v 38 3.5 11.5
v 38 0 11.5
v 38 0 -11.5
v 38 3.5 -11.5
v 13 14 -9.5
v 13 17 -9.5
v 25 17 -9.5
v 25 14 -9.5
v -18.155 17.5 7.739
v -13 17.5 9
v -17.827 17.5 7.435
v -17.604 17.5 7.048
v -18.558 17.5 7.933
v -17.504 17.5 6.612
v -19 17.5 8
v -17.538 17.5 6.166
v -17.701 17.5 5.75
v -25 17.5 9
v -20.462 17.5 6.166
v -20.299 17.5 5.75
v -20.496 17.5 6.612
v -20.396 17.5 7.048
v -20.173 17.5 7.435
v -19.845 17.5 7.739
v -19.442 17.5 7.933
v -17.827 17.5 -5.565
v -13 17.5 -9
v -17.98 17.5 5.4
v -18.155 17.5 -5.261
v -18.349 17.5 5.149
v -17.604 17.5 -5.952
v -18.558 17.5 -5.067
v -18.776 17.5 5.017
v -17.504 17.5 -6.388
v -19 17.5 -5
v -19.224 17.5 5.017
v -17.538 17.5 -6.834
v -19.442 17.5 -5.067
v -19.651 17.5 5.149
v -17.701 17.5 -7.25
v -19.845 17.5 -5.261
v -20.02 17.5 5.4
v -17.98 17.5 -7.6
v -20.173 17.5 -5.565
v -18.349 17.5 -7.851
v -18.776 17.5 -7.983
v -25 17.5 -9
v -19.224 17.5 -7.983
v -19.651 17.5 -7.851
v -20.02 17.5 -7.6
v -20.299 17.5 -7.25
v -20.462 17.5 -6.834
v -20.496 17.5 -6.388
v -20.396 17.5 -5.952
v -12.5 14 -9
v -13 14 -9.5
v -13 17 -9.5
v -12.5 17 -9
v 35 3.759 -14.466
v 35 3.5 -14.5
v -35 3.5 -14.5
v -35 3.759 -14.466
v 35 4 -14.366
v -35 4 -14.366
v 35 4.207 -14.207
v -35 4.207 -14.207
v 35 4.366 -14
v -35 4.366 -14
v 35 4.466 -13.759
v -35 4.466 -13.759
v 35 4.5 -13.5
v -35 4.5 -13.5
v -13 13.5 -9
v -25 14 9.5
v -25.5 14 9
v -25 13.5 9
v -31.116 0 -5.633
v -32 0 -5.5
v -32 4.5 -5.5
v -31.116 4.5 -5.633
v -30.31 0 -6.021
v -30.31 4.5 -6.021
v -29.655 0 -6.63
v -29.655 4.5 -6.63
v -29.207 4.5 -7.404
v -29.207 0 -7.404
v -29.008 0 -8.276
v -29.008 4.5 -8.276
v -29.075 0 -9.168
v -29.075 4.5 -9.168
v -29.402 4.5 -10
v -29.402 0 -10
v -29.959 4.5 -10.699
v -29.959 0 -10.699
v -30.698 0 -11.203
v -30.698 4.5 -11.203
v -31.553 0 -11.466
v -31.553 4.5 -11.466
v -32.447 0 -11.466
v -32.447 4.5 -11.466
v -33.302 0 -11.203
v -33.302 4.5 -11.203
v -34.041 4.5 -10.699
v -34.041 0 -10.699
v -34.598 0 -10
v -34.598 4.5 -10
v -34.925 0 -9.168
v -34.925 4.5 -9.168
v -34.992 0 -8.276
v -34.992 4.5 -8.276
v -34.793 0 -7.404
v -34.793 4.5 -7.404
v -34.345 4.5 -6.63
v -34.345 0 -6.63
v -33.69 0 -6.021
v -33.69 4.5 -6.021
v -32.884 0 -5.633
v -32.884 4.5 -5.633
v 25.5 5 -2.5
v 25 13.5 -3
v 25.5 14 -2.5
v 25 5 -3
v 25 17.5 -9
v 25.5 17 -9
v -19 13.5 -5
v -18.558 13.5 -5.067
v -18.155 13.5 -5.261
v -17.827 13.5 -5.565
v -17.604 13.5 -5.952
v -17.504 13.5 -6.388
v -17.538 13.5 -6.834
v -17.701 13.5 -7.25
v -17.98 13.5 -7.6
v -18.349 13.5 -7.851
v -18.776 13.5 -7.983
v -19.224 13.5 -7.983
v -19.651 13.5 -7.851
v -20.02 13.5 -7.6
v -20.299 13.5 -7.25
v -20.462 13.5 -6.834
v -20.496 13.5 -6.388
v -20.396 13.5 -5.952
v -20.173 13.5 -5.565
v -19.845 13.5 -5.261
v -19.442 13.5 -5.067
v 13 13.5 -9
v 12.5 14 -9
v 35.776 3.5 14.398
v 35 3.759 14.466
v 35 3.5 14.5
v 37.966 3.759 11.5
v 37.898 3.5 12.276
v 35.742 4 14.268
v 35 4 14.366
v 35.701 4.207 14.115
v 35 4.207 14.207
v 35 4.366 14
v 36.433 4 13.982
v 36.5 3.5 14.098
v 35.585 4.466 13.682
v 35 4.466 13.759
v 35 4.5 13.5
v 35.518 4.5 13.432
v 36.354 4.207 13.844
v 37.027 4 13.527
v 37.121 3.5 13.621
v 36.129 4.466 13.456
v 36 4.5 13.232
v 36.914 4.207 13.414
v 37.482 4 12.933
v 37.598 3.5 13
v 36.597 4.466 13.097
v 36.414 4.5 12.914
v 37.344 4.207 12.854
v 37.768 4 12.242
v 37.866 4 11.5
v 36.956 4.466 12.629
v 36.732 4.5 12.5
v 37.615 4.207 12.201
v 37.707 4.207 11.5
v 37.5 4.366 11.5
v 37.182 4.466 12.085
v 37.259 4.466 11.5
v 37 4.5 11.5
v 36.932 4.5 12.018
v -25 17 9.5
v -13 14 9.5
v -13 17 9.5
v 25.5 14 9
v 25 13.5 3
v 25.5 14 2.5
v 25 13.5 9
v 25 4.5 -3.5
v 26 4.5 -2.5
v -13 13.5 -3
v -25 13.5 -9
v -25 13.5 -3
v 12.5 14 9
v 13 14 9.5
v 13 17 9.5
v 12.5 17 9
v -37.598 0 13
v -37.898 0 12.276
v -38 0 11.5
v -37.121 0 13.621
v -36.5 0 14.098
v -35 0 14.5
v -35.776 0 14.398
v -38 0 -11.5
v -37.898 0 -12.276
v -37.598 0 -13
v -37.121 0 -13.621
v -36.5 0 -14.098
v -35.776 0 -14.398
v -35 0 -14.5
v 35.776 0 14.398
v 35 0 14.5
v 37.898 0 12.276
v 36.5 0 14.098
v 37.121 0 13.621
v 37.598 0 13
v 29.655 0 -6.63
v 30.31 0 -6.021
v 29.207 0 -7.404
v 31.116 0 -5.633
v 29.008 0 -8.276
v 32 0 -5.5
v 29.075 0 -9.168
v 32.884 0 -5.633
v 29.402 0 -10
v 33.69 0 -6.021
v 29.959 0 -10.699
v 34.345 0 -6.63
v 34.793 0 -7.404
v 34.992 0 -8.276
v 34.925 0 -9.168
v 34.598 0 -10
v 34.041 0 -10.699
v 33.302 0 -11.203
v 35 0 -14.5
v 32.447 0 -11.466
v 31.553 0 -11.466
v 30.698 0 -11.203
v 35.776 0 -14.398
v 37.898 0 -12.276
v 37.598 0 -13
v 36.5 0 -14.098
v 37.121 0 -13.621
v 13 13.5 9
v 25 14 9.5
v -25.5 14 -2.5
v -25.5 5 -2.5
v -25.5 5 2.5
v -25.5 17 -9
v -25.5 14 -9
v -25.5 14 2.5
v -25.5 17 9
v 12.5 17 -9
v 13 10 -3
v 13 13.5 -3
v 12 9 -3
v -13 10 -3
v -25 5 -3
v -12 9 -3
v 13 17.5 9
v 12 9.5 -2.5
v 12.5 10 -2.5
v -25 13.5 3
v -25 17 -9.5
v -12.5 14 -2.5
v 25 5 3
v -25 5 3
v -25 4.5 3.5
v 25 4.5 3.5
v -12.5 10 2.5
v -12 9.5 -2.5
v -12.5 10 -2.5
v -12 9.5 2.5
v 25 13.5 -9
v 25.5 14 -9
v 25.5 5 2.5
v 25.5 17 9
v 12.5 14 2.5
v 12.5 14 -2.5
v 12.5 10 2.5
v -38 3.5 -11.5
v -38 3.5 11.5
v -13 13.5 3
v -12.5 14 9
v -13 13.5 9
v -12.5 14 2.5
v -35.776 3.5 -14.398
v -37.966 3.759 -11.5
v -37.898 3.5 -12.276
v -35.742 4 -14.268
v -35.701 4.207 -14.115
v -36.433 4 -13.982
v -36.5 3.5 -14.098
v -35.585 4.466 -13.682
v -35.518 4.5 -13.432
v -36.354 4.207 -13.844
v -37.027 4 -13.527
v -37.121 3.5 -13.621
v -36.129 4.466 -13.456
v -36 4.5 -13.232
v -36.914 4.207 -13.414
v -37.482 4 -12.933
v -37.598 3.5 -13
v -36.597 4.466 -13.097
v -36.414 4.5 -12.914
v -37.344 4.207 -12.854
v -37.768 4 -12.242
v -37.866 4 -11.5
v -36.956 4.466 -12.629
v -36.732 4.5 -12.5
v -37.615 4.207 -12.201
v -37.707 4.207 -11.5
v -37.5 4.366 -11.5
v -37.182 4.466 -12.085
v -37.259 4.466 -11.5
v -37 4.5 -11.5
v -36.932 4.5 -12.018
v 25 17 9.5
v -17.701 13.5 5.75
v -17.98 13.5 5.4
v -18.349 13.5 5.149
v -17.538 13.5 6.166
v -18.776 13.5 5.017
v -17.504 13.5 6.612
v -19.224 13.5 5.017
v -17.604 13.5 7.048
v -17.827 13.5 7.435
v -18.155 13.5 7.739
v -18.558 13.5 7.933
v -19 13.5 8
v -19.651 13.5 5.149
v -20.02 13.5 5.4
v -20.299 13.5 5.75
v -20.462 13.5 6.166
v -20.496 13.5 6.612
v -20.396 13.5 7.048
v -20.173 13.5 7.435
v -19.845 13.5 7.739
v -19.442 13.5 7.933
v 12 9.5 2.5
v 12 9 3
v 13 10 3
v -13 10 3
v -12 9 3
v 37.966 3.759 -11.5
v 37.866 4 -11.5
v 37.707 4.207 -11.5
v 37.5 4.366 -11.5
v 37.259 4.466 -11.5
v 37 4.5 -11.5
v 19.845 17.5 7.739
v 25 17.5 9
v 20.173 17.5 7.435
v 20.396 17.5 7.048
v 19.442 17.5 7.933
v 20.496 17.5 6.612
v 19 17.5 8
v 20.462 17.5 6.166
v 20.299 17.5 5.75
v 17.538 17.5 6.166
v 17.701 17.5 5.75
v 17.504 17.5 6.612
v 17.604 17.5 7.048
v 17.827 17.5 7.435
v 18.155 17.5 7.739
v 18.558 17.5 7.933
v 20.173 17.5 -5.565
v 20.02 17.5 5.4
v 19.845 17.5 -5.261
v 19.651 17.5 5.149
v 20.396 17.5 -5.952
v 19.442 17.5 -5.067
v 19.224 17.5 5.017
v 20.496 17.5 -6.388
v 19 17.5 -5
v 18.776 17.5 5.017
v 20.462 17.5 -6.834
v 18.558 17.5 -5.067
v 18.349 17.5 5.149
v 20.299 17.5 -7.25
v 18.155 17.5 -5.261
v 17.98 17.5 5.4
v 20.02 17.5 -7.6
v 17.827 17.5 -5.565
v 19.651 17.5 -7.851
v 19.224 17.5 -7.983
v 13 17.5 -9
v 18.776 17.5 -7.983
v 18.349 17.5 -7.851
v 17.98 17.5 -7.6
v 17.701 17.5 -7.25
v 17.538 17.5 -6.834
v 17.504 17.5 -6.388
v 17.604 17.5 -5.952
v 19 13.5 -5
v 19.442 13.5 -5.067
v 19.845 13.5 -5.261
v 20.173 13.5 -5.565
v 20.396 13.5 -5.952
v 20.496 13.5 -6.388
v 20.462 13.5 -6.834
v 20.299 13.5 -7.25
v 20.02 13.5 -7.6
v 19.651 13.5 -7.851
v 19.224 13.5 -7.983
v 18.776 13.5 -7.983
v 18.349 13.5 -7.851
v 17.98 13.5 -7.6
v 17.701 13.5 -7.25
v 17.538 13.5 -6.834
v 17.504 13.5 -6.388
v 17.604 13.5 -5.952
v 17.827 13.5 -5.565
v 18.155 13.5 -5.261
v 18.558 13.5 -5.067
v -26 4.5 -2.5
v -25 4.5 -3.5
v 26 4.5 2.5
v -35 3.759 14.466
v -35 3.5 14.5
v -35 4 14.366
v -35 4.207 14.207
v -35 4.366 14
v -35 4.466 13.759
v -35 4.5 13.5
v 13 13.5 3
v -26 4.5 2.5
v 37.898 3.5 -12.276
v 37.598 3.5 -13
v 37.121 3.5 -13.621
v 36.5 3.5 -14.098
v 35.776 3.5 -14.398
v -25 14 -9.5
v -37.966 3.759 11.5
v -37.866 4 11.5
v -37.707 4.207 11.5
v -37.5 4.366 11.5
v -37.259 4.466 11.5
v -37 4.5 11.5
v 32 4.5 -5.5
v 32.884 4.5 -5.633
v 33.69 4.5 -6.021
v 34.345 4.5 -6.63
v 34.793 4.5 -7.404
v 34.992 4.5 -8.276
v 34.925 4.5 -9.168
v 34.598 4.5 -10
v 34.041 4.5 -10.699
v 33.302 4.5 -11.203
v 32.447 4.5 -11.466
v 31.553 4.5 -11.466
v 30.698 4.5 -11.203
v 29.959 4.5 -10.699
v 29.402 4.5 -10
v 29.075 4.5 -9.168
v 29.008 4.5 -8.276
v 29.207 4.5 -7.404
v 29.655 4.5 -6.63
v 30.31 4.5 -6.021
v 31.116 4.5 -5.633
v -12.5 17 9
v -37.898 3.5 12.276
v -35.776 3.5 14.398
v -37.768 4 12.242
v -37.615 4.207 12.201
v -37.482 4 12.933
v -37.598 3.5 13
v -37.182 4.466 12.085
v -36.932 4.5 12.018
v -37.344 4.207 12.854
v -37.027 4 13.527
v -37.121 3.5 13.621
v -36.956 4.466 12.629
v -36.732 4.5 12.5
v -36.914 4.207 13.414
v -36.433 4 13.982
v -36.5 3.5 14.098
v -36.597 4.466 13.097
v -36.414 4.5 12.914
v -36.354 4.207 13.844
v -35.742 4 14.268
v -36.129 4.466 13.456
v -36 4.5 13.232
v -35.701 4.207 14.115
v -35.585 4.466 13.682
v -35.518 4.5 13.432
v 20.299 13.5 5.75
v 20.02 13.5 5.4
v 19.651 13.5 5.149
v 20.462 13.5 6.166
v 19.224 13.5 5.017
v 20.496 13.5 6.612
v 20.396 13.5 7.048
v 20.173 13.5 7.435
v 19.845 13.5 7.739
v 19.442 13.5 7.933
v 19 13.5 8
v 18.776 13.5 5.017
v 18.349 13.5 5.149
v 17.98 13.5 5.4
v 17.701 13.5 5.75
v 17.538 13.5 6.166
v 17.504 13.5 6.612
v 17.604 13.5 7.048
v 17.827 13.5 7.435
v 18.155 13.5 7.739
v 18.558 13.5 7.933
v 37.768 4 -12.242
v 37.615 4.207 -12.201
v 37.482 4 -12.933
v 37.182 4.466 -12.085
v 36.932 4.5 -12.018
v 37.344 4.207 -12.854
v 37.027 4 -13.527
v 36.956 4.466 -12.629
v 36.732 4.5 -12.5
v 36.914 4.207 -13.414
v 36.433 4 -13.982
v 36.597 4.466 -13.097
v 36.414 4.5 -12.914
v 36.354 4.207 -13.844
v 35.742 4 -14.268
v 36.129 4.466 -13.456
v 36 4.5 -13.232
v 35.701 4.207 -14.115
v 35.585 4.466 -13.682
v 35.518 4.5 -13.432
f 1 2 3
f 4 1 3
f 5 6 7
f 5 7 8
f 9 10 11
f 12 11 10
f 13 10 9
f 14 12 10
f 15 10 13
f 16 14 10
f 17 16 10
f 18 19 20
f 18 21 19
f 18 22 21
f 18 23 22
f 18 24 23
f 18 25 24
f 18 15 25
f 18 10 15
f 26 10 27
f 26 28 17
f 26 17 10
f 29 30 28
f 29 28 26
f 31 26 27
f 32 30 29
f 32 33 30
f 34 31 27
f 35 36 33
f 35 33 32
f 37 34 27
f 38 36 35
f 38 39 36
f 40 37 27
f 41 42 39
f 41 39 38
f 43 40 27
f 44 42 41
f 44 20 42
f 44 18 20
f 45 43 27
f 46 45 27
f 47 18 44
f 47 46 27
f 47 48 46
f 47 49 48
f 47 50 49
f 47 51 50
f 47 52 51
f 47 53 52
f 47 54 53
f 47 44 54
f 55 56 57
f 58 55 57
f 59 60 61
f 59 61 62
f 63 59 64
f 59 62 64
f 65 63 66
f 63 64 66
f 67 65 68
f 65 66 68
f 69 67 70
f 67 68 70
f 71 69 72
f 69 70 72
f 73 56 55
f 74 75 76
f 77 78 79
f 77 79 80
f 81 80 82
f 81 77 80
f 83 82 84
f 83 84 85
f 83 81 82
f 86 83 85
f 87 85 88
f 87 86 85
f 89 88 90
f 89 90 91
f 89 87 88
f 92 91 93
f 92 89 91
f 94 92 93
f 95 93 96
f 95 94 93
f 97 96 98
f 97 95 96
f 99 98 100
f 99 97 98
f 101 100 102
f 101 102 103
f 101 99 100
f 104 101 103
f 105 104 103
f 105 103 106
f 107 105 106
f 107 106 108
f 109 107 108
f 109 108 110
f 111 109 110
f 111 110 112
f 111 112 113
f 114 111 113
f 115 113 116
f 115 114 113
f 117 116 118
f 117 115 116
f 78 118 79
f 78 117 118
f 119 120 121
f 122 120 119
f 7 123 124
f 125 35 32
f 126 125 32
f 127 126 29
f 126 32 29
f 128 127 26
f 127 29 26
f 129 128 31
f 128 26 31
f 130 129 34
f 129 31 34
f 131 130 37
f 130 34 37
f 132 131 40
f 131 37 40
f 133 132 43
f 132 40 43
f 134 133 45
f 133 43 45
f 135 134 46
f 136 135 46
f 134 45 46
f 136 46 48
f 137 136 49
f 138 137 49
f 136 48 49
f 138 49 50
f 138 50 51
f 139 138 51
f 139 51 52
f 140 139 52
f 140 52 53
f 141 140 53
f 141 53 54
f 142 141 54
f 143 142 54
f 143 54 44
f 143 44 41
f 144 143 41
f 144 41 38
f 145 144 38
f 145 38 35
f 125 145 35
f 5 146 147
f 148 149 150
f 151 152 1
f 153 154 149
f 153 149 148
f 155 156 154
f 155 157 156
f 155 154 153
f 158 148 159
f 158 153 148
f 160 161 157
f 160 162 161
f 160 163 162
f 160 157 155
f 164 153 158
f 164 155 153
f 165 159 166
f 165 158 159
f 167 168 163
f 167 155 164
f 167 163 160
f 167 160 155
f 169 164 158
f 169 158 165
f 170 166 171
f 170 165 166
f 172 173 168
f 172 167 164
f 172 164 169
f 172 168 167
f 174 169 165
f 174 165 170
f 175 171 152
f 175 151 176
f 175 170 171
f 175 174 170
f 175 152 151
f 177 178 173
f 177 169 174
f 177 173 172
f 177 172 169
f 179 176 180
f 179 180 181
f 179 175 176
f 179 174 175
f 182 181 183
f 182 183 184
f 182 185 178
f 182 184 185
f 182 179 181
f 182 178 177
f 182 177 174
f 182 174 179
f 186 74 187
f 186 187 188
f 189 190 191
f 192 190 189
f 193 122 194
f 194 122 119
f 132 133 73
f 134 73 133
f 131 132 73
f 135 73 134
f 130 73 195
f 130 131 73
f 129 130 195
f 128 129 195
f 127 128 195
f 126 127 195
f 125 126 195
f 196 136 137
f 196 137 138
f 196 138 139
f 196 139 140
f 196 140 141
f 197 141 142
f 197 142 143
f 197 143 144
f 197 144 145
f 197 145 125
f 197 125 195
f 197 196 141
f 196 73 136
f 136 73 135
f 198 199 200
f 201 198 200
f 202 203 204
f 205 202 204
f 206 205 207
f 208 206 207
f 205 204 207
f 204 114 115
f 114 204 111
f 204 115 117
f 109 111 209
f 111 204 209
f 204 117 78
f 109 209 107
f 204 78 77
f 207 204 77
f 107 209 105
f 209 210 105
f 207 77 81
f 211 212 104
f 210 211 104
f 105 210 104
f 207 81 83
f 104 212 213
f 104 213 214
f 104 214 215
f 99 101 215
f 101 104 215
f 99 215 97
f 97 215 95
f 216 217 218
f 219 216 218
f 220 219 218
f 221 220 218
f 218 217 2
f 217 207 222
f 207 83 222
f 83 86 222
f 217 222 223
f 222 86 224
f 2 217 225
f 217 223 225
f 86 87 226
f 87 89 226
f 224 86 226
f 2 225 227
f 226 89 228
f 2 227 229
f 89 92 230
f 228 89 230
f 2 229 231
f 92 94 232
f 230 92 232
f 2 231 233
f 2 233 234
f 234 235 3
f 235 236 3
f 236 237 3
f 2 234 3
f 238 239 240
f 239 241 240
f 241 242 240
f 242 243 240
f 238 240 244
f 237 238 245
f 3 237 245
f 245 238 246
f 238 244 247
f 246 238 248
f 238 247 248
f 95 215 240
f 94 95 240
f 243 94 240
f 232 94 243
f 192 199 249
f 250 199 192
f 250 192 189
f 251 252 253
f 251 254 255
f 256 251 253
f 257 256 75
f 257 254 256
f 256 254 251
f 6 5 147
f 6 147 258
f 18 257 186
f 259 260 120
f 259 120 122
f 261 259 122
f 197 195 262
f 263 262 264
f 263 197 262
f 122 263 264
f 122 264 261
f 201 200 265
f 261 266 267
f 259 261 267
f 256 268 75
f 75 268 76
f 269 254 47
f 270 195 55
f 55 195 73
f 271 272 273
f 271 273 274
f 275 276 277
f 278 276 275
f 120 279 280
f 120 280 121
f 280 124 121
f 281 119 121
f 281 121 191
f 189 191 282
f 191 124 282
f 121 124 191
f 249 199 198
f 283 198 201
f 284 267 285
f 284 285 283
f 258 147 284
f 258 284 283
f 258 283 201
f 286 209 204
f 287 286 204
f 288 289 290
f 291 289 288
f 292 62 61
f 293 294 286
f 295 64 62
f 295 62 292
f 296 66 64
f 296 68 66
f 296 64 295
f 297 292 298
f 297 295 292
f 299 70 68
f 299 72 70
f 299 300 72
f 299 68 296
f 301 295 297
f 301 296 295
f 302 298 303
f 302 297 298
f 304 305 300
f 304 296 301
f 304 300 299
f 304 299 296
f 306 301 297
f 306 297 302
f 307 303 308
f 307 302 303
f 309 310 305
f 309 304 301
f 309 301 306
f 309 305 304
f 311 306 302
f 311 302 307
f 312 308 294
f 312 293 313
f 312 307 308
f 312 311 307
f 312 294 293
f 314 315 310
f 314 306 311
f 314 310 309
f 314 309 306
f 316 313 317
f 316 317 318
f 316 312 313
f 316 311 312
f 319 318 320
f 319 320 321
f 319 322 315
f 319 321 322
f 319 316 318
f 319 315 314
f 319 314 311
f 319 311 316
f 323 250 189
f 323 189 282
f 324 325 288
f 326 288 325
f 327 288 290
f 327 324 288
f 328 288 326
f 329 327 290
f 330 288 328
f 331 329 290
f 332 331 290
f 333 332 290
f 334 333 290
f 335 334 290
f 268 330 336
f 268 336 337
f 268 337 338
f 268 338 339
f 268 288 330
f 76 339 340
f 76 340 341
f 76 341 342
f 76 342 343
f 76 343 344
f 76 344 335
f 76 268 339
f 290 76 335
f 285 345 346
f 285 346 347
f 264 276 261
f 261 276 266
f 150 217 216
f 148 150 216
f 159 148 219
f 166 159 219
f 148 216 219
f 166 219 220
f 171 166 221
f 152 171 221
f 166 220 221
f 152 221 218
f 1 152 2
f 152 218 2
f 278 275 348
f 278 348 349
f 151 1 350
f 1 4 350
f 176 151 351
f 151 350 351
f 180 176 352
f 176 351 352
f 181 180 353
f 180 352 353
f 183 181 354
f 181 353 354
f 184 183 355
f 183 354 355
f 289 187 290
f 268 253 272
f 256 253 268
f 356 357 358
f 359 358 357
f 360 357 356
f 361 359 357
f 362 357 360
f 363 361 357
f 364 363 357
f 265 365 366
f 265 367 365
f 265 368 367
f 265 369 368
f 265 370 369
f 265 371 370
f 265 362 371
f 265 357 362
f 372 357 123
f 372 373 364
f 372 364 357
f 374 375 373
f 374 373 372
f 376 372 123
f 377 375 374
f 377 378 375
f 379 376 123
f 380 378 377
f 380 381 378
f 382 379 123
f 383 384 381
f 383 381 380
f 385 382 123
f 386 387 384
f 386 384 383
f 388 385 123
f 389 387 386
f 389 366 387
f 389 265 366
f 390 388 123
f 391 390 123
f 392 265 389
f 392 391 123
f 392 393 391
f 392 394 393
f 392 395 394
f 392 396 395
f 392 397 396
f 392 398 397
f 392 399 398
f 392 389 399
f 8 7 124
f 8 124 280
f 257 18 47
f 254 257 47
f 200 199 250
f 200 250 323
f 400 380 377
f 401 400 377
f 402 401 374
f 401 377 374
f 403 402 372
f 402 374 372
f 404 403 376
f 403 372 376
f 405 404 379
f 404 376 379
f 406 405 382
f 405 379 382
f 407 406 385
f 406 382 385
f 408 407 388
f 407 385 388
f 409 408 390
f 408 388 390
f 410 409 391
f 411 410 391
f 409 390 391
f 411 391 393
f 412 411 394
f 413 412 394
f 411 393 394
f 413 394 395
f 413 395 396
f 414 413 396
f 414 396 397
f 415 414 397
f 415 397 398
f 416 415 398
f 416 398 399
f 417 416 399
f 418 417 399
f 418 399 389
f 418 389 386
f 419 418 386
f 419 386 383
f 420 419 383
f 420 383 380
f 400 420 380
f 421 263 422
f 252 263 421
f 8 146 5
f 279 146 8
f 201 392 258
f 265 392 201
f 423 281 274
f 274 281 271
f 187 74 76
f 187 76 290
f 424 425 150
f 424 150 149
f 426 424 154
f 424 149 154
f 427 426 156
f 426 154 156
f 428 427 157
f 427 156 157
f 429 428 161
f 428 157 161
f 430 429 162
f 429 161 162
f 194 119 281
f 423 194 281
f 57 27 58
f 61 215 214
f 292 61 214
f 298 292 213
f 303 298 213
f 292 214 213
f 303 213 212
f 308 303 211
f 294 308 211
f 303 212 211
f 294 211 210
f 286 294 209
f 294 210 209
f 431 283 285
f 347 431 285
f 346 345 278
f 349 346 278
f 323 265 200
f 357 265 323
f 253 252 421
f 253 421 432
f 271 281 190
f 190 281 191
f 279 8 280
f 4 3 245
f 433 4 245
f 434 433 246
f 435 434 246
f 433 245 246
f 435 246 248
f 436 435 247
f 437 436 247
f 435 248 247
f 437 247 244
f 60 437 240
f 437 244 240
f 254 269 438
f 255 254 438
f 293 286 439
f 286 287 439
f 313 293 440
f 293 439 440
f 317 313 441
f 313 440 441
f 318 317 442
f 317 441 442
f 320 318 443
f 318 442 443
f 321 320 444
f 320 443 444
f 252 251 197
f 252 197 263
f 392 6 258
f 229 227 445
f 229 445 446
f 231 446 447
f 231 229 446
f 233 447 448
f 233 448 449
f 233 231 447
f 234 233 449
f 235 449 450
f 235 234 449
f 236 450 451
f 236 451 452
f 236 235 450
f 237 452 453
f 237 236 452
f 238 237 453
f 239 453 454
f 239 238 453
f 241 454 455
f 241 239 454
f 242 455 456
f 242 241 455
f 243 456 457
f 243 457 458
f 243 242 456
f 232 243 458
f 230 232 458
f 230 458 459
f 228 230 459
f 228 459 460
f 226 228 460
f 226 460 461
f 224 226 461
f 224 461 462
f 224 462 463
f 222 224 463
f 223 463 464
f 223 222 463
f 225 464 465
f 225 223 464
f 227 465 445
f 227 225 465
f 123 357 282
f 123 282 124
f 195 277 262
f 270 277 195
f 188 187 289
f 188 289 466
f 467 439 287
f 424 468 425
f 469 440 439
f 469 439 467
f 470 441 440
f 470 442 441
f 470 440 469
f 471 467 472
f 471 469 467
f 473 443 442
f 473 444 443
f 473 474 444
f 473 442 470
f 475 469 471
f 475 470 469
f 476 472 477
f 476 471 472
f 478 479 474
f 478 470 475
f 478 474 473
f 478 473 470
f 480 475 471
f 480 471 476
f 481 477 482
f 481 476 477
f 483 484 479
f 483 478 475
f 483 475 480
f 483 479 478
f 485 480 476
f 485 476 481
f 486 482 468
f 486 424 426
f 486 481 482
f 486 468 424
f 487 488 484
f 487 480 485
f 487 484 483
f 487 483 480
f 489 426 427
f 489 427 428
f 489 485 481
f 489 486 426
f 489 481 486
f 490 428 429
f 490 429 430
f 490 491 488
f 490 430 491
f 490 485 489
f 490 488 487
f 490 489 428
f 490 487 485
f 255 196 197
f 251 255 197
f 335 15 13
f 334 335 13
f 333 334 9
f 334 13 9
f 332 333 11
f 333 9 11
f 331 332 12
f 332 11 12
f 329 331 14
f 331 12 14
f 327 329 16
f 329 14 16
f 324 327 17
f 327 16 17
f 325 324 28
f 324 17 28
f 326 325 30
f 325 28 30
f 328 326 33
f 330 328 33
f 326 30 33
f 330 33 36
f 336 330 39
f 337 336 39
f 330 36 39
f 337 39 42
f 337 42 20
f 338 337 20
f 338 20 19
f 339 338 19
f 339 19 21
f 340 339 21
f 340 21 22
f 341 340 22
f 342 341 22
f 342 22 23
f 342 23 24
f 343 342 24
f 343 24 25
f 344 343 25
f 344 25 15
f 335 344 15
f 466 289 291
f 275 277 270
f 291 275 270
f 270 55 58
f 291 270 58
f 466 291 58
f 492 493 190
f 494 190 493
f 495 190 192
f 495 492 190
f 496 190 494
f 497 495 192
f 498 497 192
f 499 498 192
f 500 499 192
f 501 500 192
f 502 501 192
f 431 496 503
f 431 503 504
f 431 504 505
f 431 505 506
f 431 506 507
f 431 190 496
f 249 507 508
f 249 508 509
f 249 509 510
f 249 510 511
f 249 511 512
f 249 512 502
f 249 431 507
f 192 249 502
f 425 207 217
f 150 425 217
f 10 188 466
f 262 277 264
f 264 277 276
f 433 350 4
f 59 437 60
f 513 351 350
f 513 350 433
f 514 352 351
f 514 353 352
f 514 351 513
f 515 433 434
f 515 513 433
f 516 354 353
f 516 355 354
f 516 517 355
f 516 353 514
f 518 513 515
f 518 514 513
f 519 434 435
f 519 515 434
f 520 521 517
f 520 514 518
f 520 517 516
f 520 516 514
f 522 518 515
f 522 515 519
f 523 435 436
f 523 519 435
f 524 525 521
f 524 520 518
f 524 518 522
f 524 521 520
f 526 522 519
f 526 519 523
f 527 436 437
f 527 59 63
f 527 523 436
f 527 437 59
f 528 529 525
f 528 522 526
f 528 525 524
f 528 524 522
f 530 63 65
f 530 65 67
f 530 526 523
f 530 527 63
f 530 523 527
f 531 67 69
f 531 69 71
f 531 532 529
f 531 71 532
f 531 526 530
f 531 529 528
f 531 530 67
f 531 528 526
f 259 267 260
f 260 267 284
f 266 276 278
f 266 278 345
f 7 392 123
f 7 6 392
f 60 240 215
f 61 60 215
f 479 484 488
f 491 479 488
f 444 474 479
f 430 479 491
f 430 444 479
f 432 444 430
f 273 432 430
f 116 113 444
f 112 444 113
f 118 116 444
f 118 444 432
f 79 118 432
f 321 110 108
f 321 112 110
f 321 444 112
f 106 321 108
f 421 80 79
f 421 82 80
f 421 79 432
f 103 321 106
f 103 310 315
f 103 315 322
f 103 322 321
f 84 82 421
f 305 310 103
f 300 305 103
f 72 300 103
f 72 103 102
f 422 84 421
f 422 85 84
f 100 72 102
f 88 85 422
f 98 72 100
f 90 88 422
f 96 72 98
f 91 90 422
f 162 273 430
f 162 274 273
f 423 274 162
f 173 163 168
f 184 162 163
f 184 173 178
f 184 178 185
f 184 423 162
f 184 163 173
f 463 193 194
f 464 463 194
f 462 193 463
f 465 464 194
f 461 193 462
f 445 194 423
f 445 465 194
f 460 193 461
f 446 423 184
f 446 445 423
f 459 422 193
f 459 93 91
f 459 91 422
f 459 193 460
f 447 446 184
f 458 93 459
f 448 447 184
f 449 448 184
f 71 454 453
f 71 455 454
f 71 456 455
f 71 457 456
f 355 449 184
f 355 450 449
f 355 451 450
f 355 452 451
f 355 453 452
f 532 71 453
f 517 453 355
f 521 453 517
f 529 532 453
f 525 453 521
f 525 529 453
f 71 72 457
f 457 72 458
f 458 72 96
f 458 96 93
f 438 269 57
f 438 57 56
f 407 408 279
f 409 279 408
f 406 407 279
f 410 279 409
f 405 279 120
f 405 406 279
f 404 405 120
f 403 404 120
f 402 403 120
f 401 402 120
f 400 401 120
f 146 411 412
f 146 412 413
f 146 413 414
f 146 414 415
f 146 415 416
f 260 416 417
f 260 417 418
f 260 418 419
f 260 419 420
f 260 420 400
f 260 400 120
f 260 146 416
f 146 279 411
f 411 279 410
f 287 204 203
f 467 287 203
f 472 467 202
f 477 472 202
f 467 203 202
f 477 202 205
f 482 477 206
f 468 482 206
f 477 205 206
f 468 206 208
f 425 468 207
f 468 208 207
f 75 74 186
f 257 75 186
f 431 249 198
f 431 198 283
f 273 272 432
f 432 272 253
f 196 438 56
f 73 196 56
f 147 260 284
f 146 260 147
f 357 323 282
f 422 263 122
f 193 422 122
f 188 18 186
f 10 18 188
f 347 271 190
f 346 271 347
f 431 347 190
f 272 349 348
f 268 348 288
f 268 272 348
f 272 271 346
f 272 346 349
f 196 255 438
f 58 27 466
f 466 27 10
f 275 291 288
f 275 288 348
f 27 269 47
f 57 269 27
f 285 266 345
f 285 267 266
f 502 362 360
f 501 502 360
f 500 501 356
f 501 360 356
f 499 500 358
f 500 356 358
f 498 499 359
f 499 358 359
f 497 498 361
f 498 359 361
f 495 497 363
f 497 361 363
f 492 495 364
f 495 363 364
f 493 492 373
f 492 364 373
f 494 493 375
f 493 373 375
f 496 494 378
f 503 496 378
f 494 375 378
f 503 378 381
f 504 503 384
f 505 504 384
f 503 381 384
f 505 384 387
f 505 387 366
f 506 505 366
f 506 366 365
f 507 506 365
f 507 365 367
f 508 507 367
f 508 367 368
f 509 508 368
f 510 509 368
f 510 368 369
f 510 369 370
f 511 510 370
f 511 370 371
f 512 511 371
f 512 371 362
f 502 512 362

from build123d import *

# Parameters (mm, degrees)
SKETCH1_R                = 3
BOSS_EXTRUDE1_DEPTH      = 4.5
BOSS_EXTRUDE2_DEPTH      = 25.5
BOSS_EXTRUDE2_DEPTH_BACK = 25.5
CUT_EXTRUDE1_DEPTH       = 9.5
CUT_EXTRUDE1_DEPTH_BACK  = 9.5
SKETCH3_W                = 25
SKETCH3_H                = 16
CUT_EXTRUDE2_REACH       = 46.278
SKETCH4_R                = 1.5
FILLET1_R                = 1
CHAMFER1_SIZE            = 0.5


with BuildPart() as part:
    # Sketch1 → Boss-Extrude1 (new body)
    with BuildSketch(Plane(origin=(0, 0, 0), x_dir=(1, 0, 0), z_dir=(0, 1, 0))):
        with BuildLine():
            Line((-35, -14.5), (35, -14.5))
            ThreePointArc((35, -14.5), (37.121320344, -13.621320344), (38, -11.5))
            Line((38, -11.5), (38, 11.5))
            ThreePointArc((38, 11.5), (37.121320344, 13.621320344), (35, 14.5))
            Line((35, 14.5), (-35, 14.5))
            ThreePointArc((-35, 14.5), (-37.121320344, 13.621320344), (-38, 11.5))
            Line((-38, 11.5), (-38, -11.5))
            ThreePointArc((-38, -11.5), (-37.121320344, -13.621320344), (-35, -14.5))
        make_face()
        with Locations(Location((-32, 8.5, 0), (0, 0, 270))):
            Circle(SKETCH1_R, mode=Mode.SUBTRACT)
        with Locations(Location((32, 8.5, 0), (0, 0, 270))):
            Circle(SKETCH1_R, mode=Mode.SUBTRACT)
    extrude(amount=BOSS_EXTRUDE1_DEPTH)

    # Sketch2 → Boss-Extrude2 (add, two sides: drawn at the far end of the back side and taken through both)
    with BuildSketch(Plane(origin=(0, 0, 0), x_dir=(0, 0, -1), z_dir=(1, 0, 0)).offset(-BOSS_EXTRUDE2_DEPTH_BACK)):
        Polygon((-3, 4.5), (-3, 13.5), (-9.5, 13.5), (-9.5, 17.5), (9.5, 17.5), (9.5, 13.5), (3, 13.5), (3, 4.5), align=None)
    extrude(amount=BOSS_EXTRUDE2_DEPTH + BOSS_EXTRUDE2_DEPTH_BACK)

    # Sketch3 → Cut-Extrude1 (cut, two sides: drawn at the far end of the back side and taken through both)
    with BuildSketch(Plane.XY.offset(-CUT_EXTRUDE1_DEPTH_BACK)):
        with Locations((0, 17.5)):
            Rectangle(SKETCH3_W, SKETCH3_H)
    extrude(amount=CUT_EXTRUDE1_DEPTH + CUT_EXTRUDE1_DEPTH_BACK, mode=Mode.SUBTRACT)

    # Sketch4 → Cut-Extrude2 (cut, up to next)
    with BuildSketch(Plane(origin=(0, 17.5, 0), x_dir=(1, 0, 0), z_dir=(0, 1, 0)), mode=Mode.PRIVATE) as cut_extrude2_sk1:
        with Locations(Location((-19, 6.5, 0), (0, 0, 270))):
            Circle(SKETCH4_R)
    cut_extrude2_tool1 = extrude(cut_extrude2_sk1.sketch, amount=-CUT_EXTRUDE2_REACH, mode=Mode.PRIVATE) & part.part
    # Sketch4 → Cut-Extrude2 (cut, up to next)
    with BuildSketch(Plane(origin=(0, 17.5, 0), x_dir=(1, 0, 0), z_dir=(0, 1, 0)), mode=Mode.PRIVATE) as cut_extrude2_sk2:
        with Locations(Location((-19, -6.5, 0), (0, 0, 270))):
            Circle(SKETCH4_R)
    cut_extrude2_tool2 = extrude(cut_extrude2_sk2.sketch, amount=-CUT_EXTRUDE2_REACH, mode=Mode.PRIVATE) & part.part
    # Sketch4 → Cut-Extrude2 (cut, up to next)
    with BuildSketch(Plane(origin=(0, 17.5, 0), x_dir=(1, 0, 0), z_dir=(0, 1, 0)), mode=Mode.PRIVATE) as cut_extrude2_sk3:
        with Locations(Location((19, -6.5, 0), (0, 0, 270))):
            Circle(SKETCH4_R)
    cut_extrude2_tool3 = extrude(cut_extrude2_sk3.sketch, amount=-CUT_EXTRUDE2_REACH, mode=Mode.PRIVATE) & part.part
    # Sketch4 → Cut-Extrude2 (cut, up to next)
    with BuildSketch(Plane(origin=(0, 17.5, 0), x_dir=(1, 0, 0), z_dir=(0, 1, 0)), mode=Mode.PRIVATE) as cut_extrude2_sk4:
        with Locations(Location((19, 6.5, 0), (0, 0, 270))):
            Circle(SKETCH4_R)
    cut_extrude2_tool4 = extrude(cut_extrude2_sk4.sketch, amount=-CUT_EXTRUDE2_REACH, mode=Mode.PRIVATE) & part.part
    add(cut_extrude2_tool1.solids().sort_by_distance((-19, 17.5, -6.5))[0], mode=Mode.SUBTRACT)
    add(cut_extrude2_tool2.solids().sort_by_distance((-19, 17.5, 6.5))[0], mode=Mode.SUBTRACT)
    add(cut_extrude2_tool3.solids().sort_by_distance((19, 17.5, 6.5))[0], mode=Mode.SUBTRACT)
    add(cut_extrude2_tool4.solids().sort_by_distance((19, 17.5, -6.5))[0], mode=Mode.SUBTRACT)

    # Fillet1
    fillet1_edges = [part.edges().sort_by_distance(p)[0] for p in [
        (37.121320344, 4.5, 13.621320344),
        (38, 4.5, 0),
        (37.121320344, 4.5, -13.621320344),
        (0, 4.5, -14.5),
        (-37.121320344, 4.5, -13.621320344),
        (-38, 4.5, 0),
        (-37.121320344, 4.5, 13.621320344),
        (0, 4.5, 14.5),
    ]]
    fillet(fillet1_edges, radius=FILLET1_R)

    # Chamfer1
    chamfer1_edges = [part.edges().sort_by_distance(p)[0] for p in [
        (25.5, 9, 3),
        (25.5, 13.5, 6.25),
        (19, 13.5, 9.5),
        (25.5, 15.5, 9.5),
        (19, 17.5, 9.5),
        (25.5, 17.5, 0),
        (19, 17.5, -9.5),
        (25.5, 15.5, -9.5),
        (19, 13.5, -9.5),
        (25.5, 13.5, -6.25),
        (25.5, 9, -3),
        (0, 4.5, -3),
        (25.5, 4.5, 0),
        (0, 4.5, 3),
        (-25.5, 4.5, 0),
        (-25.5, 9, 3),
        (-25.5, 13.5, 6.25),
        (-25.5, 15.5, 9.5),
        (-25.5, 17.5, 0),
        (-25.5, 15.5, -9.5),
        (-25.5, 13.5, -6.25),
        (-25.5, 9, -3),
        (-12.5, 11.5, -3),
        (0, 9.5, -3),
        (12.5, 11.5, -3),
        (-19, 13.5, -9.5),
        (-19, 17.5, -9.5),
        (-19, 17.5, 9.5),
        (-19, 13.5, 9.5),
        (-12.5, 15.5, 9.5),
        (12.5, 15.5, 9.5),
        (12.5, 13.5, 6.25),
        (12.5, 11.5, 3),
        (12.5, 13.5, -6.25),
        (12.5, 15.5, -9.5),
        (12.5, 17.5, 0),
        (12.5, 9.5, 0),
        (0, 9.5, 3),
        (-12.5, 9.5, 0),
        (-12.5, 11.5, 3),
        (-12.5, 13.5, 6.25),
        (-12.5, 17.5, 0),
        (-12.5, 15.5, -9.5),
        (-12.5, 13.5, -6.25),
    ]]
    chamfer(chamfer1_edges, length=CHAMFER1_SIZE)


solid = part.part
